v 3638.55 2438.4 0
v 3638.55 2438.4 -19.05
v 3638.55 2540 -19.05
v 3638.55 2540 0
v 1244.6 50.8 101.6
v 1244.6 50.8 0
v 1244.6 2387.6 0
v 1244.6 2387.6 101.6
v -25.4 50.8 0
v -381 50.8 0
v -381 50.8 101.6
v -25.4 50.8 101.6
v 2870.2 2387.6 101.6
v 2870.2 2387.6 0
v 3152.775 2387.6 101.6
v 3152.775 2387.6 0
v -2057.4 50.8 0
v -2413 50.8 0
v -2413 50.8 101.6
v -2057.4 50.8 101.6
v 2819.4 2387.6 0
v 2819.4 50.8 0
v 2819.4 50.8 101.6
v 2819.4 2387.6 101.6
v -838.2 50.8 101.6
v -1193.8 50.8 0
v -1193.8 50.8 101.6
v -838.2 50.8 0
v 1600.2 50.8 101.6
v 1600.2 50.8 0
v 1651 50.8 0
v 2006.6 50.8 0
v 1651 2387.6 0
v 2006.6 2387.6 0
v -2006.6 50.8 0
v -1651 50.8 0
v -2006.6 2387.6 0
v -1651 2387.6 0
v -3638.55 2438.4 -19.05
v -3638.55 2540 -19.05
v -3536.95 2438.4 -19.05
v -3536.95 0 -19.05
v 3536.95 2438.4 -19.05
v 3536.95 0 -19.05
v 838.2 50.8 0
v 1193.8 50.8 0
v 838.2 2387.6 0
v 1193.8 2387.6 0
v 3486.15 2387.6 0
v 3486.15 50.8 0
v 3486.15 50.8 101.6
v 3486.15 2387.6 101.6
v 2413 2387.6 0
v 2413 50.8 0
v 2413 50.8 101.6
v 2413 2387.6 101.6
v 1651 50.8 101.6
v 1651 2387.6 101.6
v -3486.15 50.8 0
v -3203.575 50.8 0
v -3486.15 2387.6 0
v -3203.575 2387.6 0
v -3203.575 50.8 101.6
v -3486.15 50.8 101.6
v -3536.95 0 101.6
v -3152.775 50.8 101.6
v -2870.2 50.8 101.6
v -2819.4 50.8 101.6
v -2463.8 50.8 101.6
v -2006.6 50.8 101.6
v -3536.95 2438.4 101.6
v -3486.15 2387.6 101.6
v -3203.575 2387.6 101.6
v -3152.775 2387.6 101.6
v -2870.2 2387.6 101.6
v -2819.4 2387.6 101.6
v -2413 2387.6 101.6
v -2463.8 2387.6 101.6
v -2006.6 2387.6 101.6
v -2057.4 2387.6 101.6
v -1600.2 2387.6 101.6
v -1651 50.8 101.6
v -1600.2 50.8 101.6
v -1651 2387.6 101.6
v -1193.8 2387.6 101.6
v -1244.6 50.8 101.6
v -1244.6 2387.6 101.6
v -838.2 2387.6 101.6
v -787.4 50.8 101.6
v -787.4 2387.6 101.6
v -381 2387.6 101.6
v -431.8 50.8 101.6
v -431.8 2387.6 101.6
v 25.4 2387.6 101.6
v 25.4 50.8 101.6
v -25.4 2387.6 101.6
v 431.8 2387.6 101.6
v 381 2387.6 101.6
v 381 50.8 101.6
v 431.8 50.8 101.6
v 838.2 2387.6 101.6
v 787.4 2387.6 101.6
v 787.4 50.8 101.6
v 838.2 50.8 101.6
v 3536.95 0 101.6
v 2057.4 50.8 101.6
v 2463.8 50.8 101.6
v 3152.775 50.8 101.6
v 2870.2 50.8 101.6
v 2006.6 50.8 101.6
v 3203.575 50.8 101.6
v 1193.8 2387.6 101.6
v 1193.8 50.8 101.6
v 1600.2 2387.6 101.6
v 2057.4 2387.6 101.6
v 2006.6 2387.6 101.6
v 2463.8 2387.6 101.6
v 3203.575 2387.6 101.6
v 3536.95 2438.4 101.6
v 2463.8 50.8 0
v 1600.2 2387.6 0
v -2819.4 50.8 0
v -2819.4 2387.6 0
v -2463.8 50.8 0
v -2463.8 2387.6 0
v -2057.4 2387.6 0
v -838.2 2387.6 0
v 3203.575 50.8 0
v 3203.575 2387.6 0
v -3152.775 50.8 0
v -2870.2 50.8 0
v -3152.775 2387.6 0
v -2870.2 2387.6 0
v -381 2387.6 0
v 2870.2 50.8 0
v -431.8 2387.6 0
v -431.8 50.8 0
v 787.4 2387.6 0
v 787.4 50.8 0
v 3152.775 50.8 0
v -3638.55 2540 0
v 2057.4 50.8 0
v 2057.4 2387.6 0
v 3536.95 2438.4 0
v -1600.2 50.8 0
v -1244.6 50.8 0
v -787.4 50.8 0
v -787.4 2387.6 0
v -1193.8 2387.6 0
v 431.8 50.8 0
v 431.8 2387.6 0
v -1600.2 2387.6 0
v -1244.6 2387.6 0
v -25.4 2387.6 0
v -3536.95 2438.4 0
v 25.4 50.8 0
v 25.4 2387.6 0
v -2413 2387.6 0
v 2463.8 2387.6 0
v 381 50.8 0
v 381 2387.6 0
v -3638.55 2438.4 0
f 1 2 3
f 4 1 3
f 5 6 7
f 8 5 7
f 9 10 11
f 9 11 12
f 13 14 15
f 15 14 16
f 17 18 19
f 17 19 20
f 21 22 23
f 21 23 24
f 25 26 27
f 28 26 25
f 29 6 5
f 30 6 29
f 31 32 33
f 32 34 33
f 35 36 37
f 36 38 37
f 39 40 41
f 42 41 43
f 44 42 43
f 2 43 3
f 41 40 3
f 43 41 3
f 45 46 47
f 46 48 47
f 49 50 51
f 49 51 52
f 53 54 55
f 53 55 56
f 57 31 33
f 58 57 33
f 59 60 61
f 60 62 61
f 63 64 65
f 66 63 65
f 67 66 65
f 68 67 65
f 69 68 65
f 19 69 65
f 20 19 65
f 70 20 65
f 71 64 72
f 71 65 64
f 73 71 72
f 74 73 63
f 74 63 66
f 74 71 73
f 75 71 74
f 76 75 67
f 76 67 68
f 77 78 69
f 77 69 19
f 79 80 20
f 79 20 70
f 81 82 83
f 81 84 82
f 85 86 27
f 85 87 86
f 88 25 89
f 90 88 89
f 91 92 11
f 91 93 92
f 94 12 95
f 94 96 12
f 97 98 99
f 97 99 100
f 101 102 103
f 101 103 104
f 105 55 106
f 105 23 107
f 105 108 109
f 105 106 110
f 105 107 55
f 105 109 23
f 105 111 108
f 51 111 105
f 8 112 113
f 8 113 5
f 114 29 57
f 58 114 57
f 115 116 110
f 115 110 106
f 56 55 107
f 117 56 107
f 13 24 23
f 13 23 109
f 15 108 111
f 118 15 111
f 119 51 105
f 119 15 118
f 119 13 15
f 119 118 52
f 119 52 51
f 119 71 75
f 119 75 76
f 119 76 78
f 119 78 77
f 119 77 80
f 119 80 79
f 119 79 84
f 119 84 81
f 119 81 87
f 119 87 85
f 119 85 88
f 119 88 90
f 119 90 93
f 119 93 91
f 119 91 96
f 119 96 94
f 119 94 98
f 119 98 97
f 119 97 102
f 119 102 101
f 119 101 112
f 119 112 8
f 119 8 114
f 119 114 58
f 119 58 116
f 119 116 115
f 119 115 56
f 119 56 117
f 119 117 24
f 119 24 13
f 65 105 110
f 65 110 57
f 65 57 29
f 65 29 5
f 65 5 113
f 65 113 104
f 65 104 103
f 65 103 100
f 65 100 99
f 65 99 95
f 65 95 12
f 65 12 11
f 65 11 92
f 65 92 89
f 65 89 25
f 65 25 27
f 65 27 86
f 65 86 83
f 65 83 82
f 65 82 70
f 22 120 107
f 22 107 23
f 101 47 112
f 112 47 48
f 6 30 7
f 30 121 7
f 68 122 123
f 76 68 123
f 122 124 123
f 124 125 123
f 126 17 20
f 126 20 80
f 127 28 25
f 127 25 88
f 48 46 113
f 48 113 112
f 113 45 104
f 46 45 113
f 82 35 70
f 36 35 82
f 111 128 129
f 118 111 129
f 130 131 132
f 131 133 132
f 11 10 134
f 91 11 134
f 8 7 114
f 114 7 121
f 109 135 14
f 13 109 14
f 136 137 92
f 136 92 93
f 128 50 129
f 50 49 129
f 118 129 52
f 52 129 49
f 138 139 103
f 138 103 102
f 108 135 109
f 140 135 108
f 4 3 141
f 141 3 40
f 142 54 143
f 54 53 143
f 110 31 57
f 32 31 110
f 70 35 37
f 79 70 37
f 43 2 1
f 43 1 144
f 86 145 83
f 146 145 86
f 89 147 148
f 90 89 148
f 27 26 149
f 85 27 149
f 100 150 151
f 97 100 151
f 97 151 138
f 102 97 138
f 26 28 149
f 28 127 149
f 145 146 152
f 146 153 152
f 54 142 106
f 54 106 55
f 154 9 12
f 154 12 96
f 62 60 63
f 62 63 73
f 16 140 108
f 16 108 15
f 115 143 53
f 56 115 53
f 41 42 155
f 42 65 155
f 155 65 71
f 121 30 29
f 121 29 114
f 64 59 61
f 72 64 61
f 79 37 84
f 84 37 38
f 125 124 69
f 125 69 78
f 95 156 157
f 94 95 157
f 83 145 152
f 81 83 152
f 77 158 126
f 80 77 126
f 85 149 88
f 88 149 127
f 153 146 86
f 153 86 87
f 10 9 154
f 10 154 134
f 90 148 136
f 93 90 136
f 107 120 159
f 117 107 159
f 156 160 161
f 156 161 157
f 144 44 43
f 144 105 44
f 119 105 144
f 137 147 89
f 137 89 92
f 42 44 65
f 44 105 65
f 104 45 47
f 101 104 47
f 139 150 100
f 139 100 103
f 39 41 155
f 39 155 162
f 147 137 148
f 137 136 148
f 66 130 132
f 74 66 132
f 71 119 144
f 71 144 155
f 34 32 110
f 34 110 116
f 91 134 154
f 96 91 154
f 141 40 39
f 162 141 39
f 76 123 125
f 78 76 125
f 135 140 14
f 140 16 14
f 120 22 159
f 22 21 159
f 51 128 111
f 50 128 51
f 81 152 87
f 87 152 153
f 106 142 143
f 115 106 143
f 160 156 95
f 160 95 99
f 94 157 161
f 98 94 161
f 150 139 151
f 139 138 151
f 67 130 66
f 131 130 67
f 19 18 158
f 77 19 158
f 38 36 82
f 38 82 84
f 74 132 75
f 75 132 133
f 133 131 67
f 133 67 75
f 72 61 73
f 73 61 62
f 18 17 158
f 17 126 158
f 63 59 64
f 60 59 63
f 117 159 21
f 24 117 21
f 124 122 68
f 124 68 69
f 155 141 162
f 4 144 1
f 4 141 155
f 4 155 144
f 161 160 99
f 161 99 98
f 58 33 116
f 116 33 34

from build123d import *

# Parameters (mm, degrees)
SKETCH1_W           = 355.6
SKETCH1_H           = 2336.8
SKETCH1_W_2         = 282.575
BOSS_EXTRUDE1_DEPTH = 101.6
SKETCH2_W           = 7073.9
SKETCH2_H           = 2438.4
BOSS_EXTRUDE2_DEPTH = 19.05
BOSS_EXTRUDE3_DEPTH = 19.05


with BuildPart() as part:
    # Sketch1 → Boss-Extrude1 (new body)
    with BuildSketch(Plane.XY):
        Polygon((0, 0), (3536.95, 0), (3536.95, 2438.4), (-3536.95, 2438.4), (-3536.95, 0), align=None)
        with Locations((203.2, 1219.2)):
            Rectangle(SKETCH1_W, SKETCH1_H, mode=Mode.SUBTRACT)
        with Locations((-203.2, 1219.2)):
            Rectangle(SKETCH1_W, SKETCH1_H, mode=Mode.SUBTRACT)
        with Locations((609.6, 1219.2)):
            Rectangle(SKETCH1_W, SKETCH1_H, mode=Mode.SUBTRACT)
        with Locations((1016, 1219.2)):
            Rectangle(SKETCH1_W, SKETCH1_H, mode=Mode.SUBTRACT)
        with Locations((-3344.8625, 1219.2)):
            Rectangle(SKETCH1_W_2, SKETCH1_H, mode=Mode.SUBTRACT)
        with Locations((3344.8625, 1219.2)):
            Rectangle(SKETCH1_W_2, SKETCH1_H, mode=Mode.SUBTRACT)
        with Locations((1422.4, 1219.2)):
            Rectangle(SKETCH1_W, SKETCH1_H, mode=Mode.SUBTRACT)
        with Locations((1828.8, 1219.2)):
            Rectangle(SKETCH1_W, SKETCH1_H, mode=Mode.SUBTRACT)
        with Locations((2235.2, 1219.2)):
            Rectangle(SKETCH1_W, SKETCH1_H, mode=Mode.SUBTRACT)
        with Locations((2641.6, 1219.2)):
            Rectangle(SKETCH1_W, SKETCH1_H, mode=Mode.SUBTRACT)
        with Locations((3011.4875, 1219.2)):
            Rectangle(SKETCH1_W_2, SKETCH1_H, mode=Mode.SUBTRACT)
        with Locations((-609.6, 1219.2)):
            Rectangle(SKETCH1_W, SKETCH1_H, mode=Mode.SUBTRACT)
        with Locations((-1016, 1219.2)):
            Rectangle(SKETCH1_W, SKETCH1_H, mode=Mode.SUBTRACT)
        with Locations((-1422.4, 1219.2)):
            Rectangle(SKETCH1_W, SKETCH1_H, mode=Mode.SUBTRACT)
        with Locations((-1828.8, 1219.2)):
            Rectangle(SKETCH1_W, SKETCH1_H, mode=Mode.SUBTRACT)
        with Locations((-2235.2, 1219.2)):
            Rectangle(SKETCH1_W, SKETCH1_H, mode=Mode.SUBTRACT)
        with Locations((-2641.6, 1219.2)):
            Rectangle(SKETCH1_W, SKETCH1_H, mode=Mode.SUBTRACT)
        with Locations((-3011.4875, 1219.2)):
            Rectangle(SKETCH1_W_2, SKETCH1_H, mode=Mode.SUBTRACT)
    extrude(amount=BOSS_EXTRUDE1_DEPTH)

    # Sketch2 → Boss-Extrude2 (add)
    with BuildSketch(Plane(origin=(0, 0, 0), x_dir=(-1, 0, 0), z_dir=(0, 0, -1))):
        with Locations((0, 1219.2)):
            Rectangle(SKETCH2_W, SKETCH2_H)
    extrude(amount=BOSS_EXTRUDE2_DEPTH)

    # Sketch3 → Boss-Extrude3 (add)
    with BuildSketch(Plane(origin=(0, 0, -19.05), x_dir=(-1, 0, 0), z_dir=(0, 0, -1))):
        Polygon((-3536.95, 2438.4), (-3638.55, 2438.4), (-3638.55, 2540), (3638.55, 2540), (3638.55, 2438.4), (3536.95, 2438.4), align=None)
    extrude(amount=-BOSS_EXTRUDE3_DEPTH)


solid = part.part
